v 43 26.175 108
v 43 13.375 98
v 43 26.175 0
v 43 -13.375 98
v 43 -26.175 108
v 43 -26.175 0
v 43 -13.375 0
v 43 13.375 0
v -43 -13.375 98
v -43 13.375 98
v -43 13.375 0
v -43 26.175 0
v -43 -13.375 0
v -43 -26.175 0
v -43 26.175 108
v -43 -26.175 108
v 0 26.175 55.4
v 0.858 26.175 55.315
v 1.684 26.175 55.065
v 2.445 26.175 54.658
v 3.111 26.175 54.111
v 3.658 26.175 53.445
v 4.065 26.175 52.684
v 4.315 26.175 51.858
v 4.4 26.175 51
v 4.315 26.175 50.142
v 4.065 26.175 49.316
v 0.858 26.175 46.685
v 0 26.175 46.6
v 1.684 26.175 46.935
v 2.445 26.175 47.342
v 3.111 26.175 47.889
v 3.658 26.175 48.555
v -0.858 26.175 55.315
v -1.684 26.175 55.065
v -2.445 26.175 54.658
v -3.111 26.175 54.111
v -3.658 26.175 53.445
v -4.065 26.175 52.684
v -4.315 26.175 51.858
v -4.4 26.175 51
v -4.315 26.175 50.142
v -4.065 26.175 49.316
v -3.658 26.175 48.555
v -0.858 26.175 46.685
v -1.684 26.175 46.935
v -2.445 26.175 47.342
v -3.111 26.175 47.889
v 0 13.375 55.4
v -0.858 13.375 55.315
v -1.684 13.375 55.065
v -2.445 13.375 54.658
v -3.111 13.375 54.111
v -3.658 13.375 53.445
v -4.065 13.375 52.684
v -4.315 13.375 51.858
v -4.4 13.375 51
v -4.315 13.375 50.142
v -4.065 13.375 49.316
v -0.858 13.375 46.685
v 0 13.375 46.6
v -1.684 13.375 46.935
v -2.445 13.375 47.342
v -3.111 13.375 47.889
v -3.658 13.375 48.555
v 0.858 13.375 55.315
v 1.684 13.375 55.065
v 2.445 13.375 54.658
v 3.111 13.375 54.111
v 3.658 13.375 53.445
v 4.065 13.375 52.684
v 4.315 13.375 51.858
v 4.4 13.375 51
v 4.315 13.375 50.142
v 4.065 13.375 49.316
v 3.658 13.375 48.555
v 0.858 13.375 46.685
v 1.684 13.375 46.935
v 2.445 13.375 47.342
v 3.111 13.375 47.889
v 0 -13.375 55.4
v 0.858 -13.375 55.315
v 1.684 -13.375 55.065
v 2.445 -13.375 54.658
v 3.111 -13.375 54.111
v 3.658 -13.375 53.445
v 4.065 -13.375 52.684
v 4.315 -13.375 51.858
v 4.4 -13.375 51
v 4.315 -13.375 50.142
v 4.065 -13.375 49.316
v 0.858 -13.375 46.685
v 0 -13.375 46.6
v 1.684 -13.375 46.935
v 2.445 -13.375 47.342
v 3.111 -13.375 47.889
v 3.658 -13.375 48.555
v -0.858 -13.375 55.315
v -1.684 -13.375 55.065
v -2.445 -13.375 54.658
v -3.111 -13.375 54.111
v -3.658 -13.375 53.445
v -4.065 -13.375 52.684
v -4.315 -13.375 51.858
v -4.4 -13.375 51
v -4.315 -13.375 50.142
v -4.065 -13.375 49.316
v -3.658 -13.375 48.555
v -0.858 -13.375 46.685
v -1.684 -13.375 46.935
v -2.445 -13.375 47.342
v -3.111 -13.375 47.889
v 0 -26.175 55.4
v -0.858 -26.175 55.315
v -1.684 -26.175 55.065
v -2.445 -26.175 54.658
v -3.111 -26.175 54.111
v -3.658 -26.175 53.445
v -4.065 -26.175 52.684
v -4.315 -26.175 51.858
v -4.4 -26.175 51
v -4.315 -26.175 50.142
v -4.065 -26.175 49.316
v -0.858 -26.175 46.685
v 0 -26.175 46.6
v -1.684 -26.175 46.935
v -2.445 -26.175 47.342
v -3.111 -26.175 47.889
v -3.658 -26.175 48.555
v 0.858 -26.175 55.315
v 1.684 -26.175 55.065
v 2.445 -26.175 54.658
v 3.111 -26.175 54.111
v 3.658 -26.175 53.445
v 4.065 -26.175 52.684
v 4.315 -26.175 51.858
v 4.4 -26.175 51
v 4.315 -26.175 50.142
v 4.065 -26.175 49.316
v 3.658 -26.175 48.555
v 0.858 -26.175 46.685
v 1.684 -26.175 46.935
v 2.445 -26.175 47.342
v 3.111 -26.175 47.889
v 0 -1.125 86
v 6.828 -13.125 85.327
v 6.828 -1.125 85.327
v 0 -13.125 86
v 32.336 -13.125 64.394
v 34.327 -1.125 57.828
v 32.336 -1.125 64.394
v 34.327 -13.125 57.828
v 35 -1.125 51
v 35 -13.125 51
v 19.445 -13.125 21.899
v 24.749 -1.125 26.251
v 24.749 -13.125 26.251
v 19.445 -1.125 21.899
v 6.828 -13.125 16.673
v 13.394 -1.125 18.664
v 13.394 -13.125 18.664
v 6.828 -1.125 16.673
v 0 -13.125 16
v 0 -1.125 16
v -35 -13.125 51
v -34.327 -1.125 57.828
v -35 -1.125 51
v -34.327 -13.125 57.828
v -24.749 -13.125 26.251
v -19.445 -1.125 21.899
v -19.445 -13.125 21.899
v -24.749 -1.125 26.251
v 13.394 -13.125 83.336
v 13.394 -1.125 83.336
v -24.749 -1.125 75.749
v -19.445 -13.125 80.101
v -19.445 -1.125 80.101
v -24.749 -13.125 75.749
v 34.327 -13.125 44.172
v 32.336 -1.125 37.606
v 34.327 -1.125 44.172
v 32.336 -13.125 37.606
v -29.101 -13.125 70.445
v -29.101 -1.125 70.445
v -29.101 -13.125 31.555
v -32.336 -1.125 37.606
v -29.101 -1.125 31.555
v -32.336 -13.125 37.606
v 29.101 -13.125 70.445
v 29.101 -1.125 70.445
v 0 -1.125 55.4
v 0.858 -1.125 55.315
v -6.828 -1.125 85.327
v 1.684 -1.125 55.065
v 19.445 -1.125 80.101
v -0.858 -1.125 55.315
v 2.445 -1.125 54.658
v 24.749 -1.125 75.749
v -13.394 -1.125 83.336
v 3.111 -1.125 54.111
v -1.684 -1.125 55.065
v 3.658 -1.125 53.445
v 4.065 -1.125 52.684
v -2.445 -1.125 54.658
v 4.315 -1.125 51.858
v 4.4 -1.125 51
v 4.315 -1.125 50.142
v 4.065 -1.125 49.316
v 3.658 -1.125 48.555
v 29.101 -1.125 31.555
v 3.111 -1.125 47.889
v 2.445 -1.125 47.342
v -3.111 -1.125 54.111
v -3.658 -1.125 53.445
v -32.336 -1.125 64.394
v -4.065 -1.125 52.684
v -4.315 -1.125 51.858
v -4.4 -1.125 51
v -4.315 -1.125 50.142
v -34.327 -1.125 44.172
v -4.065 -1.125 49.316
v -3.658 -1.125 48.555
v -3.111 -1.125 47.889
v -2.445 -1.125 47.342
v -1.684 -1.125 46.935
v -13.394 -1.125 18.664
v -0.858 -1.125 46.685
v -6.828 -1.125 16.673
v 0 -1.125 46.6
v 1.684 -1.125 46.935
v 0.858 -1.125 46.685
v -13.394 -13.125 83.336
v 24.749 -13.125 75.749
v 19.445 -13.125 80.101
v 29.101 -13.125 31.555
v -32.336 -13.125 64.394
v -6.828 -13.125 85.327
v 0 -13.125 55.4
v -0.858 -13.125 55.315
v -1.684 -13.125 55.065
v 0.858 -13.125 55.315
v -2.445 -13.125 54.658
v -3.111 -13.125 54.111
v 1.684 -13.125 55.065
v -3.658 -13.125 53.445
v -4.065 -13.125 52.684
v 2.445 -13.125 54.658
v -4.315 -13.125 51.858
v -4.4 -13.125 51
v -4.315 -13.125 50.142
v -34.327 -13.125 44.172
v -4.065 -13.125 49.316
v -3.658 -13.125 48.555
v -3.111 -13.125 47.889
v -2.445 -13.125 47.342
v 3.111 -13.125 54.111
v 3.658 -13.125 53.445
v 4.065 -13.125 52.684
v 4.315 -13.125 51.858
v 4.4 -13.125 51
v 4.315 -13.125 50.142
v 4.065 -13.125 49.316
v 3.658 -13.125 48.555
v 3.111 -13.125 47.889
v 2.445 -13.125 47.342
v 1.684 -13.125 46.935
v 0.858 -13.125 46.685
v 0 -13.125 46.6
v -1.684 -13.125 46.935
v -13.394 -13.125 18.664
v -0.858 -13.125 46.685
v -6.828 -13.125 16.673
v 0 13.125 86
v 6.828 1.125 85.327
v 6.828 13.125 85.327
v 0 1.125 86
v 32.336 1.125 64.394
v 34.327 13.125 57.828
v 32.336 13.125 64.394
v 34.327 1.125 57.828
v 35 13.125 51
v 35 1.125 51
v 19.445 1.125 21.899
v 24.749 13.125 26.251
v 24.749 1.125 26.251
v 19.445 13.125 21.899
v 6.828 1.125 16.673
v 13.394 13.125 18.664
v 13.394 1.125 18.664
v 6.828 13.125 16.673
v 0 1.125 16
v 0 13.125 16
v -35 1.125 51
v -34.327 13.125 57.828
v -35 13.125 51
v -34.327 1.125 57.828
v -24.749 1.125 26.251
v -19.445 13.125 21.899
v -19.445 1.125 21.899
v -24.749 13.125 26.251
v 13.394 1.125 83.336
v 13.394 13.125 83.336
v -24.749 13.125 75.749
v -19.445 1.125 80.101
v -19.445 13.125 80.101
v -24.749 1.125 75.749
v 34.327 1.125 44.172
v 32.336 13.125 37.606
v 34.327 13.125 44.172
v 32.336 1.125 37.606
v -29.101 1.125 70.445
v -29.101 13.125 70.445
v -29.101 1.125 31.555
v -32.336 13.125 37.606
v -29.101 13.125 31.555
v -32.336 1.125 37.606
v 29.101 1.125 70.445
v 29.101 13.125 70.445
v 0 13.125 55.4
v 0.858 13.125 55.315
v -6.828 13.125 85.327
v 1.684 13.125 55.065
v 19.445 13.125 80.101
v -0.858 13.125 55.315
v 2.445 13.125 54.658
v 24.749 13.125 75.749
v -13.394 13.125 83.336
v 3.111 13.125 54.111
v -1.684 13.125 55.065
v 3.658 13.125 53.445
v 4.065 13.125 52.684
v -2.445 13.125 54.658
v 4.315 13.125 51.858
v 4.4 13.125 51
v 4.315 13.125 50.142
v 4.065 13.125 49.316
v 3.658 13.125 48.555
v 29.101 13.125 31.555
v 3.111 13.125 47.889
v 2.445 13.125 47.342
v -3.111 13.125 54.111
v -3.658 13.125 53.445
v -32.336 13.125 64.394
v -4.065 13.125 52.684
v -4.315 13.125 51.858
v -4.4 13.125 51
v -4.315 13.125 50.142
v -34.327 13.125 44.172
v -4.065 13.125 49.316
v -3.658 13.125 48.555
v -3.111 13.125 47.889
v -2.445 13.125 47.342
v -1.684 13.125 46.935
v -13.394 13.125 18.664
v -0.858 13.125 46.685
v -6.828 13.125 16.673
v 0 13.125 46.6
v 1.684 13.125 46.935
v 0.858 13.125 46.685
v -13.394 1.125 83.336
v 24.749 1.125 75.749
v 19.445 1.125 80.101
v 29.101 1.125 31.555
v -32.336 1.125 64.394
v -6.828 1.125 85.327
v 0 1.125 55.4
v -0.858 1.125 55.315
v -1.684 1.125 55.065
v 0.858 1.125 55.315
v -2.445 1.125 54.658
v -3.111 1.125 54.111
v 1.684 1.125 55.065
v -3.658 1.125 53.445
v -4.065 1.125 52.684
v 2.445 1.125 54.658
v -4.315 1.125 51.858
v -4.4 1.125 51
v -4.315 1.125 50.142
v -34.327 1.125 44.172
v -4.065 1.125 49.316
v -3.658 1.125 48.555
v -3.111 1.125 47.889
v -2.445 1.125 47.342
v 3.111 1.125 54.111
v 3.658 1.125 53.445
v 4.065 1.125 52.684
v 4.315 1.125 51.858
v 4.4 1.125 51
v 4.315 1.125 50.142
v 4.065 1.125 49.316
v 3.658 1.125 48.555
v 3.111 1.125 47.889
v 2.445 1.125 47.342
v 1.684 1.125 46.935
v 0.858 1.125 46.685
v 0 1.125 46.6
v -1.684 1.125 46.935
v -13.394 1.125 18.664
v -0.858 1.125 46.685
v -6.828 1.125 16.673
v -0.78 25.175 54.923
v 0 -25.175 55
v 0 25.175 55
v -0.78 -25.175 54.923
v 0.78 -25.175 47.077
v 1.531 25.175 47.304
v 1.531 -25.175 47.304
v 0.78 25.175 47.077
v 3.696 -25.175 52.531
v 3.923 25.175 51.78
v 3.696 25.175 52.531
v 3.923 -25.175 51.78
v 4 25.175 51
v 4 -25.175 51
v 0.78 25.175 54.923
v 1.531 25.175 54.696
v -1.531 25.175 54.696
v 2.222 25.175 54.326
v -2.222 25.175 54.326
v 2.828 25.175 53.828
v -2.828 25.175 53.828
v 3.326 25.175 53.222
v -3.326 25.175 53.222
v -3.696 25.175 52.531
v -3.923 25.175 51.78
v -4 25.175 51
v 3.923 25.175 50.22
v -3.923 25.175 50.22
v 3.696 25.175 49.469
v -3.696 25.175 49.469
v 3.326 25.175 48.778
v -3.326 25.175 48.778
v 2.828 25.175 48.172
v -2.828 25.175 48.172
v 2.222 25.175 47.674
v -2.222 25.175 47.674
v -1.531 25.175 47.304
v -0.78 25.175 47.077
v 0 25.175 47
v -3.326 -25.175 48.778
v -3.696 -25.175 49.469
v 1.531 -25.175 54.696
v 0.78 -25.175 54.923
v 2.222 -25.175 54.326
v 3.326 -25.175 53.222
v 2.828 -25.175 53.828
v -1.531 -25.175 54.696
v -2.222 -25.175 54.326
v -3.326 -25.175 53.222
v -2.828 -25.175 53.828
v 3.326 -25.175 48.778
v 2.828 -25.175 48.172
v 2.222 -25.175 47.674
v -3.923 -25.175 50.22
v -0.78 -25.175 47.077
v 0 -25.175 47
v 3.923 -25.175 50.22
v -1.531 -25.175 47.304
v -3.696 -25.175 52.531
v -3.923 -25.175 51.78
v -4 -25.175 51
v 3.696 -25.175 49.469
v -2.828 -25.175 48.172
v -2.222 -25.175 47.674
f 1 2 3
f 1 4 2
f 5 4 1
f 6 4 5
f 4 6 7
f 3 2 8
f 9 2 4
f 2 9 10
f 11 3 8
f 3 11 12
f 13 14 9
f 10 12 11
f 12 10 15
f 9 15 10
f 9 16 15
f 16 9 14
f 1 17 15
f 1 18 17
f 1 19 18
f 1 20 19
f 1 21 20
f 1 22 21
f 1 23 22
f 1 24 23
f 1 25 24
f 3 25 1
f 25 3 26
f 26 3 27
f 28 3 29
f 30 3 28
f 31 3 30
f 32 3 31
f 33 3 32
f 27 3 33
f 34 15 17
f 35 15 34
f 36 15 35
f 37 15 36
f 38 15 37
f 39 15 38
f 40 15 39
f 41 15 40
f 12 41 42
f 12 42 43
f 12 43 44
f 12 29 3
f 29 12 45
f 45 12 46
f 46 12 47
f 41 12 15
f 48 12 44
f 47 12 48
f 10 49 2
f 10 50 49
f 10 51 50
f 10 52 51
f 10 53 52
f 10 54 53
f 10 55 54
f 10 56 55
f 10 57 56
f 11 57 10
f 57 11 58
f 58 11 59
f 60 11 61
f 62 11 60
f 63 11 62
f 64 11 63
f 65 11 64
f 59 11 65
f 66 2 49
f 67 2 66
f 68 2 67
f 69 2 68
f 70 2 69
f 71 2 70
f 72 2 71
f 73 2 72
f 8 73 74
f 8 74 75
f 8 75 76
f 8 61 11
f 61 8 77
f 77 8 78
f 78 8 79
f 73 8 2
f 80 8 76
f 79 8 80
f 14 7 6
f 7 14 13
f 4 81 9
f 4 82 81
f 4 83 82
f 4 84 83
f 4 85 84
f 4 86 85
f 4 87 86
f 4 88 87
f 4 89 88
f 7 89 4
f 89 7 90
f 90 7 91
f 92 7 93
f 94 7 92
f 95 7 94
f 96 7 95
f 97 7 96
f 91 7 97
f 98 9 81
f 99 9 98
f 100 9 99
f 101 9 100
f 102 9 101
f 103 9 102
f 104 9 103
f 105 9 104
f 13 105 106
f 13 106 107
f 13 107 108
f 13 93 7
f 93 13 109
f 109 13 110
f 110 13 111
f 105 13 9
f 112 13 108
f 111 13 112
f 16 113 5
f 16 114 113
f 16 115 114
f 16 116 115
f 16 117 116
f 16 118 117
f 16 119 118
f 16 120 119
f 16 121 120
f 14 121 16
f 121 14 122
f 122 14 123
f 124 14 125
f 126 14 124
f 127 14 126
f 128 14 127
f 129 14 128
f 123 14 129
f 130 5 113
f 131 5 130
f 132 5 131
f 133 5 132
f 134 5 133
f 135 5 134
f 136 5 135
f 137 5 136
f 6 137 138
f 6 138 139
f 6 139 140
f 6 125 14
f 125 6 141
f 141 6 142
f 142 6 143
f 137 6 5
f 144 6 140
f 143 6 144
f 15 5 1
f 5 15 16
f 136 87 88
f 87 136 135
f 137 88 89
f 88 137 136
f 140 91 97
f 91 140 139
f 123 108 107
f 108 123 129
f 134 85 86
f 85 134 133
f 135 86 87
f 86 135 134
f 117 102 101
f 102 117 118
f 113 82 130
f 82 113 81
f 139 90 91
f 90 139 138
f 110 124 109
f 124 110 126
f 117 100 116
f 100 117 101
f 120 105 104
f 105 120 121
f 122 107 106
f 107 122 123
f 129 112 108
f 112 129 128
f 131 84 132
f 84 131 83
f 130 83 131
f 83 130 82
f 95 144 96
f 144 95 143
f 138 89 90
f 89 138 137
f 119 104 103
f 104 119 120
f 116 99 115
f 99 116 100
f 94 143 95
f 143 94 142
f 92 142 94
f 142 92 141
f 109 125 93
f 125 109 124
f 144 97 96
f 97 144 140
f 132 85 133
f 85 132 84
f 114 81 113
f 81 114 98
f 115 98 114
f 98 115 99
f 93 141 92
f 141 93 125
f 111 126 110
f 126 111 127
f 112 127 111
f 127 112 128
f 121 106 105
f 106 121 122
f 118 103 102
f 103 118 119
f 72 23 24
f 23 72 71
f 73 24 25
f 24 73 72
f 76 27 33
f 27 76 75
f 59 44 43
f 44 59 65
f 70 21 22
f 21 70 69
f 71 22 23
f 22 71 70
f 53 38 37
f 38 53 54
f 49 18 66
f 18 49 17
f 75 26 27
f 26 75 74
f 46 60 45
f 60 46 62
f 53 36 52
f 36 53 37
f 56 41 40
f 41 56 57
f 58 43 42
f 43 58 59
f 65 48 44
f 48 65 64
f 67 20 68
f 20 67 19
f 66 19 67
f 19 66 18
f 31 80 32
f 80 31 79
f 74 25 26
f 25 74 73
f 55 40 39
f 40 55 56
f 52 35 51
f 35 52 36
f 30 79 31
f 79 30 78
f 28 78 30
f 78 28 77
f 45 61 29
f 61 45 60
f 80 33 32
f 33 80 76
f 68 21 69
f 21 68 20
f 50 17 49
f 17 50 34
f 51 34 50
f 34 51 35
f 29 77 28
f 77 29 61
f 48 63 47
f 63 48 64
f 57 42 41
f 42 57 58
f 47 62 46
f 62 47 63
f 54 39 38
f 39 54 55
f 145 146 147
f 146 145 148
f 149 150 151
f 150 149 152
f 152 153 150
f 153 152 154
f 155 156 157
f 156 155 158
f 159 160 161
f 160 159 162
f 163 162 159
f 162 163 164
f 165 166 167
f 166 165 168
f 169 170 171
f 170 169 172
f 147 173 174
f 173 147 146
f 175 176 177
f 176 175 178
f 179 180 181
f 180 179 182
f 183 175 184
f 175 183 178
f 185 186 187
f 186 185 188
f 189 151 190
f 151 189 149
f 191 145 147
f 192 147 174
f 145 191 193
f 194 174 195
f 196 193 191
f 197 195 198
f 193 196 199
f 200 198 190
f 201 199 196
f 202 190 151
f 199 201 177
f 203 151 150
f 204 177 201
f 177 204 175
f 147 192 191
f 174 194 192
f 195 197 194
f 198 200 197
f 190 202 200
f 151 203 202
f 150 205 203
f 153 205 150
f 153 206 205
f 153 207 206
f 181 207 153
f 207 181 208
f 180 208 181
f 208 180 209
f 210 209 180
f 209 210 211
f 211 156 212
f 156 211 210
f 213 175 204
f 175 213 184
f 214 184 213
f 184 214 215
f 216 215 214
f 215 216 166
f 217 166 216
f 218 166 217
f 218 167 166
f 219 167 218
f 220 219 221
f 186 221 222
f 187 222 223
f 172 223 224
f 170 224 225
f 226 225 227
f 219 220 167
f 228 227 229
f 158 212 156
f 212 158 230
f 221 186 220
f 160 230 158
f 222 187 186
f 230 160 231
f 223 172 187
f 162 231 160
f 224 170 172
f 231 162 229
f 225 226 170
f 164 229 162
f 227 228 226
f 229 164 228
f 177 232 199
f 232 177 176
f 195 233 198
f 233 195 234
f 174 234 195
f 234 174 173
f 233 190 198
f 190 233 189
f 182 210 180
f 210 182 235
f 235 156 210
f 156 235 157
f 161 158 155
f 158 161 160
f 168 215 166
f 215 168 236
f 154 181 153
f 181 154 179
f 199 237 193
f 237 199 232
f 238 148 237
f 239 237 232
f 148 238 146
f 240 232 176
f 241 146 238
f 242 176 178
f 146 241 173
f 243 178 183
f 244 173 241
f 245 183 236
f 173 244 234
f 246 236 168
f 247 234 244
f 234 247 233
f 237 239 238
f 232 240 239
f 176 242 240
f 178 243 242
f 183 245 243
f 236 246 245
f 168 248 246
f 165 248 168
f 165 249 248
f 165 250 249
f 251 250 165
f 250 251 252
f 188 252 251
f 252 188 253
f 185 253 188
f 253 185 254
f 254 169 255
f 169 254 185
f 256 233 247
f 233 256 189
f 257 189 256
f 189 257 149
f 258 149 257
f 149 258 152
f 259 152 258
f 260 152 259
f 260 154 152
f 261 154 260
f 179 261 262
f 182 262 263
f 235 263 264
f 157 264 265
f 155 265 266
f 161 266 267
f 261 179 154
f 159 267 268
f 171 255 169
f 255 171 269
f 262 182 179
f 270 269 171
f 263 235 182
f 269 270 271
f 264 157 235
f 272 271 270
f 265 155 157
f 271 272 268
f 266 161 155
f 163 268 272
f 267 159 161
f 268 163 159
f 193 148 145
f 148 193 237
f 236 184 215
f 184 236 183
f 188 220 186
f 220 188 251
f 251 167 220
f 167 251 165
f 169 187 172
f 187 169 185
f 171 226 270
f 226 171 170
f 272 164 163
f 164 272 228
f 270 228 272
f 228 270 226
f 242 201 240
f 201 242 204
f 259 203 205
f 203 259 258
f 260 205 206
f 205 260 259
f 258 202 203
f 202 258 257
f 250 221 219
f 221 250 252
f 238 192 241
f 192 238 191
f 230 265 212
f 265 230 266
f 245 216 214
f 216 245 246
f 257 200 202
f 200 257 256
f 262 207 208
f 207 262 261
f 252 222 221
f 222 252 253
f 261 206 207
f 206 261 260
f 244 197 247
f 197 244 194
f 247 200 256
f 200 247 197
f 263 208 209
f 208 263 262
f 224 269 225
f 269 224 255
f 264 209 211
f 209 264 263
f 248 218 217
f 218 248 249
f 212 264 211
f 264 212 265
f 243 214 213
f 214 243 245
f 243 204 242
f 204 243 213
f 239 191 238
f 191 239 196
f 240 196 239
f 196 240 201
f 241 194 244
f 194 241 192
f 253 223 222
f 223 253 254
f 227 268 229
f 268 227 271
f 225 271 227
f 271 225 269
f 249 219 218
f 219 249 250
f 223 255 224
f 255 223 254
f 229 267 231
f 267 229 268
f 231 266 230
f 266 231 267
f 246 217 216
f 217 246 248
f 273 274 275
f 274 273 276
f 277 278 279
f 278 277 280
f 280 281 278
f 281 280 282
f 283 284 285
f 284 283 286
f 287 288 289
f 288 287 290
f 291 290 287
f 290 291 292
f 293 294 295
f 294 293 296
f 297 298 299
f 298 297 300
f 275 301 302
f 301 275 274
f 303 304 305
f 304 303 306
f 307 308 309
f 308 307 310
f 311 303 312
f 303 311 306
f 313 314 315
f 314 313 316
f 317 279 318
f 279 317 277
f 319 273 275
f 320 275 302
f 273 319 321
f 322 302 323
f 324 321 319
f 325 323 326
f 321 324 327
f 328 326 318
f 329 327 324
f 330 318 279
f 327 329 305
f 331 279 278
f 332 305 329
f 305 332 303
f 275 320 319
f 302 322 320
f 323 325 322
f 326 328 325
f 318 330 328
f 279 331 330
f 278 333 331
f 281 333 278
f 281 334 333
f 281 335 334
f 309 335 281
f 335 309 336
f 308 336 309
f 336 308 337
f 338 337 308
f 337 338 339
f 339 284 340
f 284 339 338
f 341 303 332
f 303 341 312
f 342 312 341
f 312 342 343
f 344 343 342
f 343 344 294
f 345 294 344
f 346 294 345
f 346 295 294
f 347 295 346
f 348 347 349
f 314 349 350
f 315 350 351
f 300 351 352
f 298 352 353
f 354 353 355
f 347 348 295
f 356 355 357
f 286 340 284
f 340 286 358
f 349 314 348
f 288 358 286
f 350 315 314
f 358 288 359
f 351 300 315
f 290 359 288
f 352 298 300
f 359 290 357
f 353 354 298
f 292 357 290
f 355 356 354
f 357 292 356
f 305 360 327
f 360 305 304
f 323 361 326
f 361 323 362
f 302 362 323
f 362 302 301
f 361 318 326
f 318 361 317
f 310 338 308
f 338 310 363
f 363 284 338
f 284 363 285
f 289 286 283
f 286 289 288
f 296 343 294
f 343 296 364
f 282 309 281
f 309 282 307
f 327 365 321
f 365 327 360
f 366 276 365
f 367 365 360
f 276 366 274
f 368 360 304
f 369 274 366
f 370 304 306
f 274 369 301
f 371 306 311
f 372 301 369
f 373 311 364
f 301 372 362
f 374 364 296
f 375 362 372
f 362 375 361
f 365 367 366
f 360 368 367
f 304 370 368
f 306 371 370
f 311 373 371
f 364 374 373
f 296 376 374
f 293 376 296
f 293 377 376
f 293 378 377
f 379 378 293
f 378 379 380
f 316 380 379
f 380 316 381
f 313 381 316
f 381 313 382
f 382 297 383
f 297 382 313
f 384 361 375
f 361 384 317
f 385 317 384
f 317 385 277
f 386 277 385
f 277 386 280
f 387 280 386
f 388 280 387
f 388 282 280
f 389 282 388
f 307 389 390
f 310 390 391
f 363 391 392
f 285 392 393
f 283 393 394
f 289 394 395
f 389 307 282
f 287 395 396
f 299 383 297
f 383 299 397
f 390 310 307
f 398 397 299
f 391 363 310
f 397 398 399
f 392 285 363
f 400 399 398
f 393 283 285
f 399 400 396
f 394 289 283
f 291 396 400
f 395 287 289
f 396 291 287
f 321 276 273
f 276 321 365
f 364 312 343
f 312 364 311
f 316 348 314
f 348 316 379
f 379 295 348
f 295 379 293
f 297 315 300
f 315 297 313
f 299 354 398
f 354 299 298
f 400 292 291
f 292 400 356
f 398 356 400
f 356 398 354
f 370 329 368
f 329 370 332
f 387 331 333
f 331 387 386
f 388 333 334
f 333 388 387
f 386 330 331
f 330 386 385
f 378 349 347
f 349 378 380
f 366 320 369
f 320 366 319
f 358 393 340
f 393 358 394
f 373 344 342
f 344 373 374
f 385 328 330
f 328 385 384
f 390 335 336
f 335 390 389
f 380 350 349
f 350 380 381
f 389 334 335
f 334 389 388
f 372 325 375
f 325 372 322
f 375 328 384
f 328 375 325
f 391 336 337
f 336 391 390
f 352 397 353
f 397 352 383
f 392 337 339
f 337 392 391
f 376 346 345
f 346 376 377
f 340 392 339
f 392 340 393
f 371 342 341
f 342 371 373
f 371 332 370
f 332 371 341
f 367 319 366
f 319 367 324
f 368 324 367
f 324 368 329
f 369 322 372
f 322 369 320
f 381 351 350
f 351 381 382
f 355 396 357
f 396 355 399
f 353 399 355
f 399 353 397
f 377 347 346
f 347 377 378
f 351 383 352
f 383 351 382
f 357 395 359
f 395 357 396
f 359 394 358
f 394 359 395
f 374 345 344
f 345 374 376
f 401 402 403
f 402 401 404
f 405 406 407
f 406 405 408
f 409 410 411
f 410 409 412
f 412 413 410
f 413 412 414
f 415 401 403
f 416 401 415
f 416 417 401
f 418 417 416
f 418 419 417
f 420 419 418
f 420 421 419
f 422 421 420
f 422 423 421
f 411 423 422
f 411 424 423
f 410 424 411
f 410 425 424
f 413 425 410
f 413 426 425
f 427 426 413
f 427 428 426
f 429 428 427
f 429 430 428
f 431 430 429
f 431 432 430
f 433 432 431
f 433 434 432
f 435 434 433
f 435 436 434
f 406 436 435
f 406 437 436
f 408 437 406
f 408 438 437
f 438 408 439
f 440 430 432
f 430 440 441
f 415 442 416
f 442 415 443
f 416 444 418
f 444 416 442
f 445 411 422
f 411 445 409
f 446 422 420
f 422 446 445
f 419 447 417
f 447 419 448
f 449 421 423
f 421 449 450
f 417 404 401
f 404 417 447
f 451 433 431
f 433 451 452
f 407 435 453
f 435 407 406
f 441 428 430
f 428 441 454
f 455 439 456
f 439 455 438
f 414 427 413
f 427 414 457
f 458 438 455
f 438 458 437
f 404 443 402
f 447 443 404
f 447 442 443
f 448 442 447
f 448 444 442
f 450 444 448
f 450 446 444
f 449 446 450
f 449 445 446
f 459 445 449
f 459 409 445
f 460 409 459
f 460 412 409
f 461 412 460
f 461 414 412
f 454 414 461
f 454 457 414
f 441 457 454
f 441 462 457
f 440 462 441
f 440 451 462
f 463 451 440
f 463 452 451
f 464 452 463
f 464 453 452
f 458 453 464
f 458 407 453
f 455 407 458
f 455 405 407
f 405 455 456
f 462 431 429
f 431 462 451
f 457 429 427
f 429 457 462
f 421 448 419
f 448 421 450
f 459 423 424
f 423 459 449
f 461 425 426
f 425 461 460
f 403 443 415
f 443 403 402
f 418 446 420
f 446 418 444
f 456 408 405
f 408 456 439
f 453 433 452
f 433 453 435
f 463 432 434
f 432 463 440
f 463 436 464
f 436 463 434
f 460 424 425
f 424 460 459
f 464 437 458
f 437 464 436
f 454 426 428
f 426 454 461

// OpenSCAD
$fn = 32;

// ------------------------------------------------------------------------
// Trolley wheel set: wheels d70, fork 98 mm tall
// Every part is its own module, assembly() places every instance.
// ------------------------------------------------------------------------

// --- part 1 ---
module trolley_fork() {
  difference() {
    union() {
      translate([-43, 13.375, 0]) cube([86, 12.8, 98]);
      translate([-43, -26.175, 0]) cube([86, 12.8, 98]);
      translate([-43, -26.175, 98]) cube([86, 52.35, 10]);
    }
    translate([0, -19.775, 51]) rotate([90, 0, 0]) cylinder(h = 14.8, d = 8.8, center = true);
    translate([0, 19.775, 51]) rotate([90, 0, 0]) cylinder(h = 14.8, d = 8.8, center = true);
  }
}

// --- part 2 ---
module trolley_wheel() {
  difference() {
      translate([0, 0, 0]) cylinder(h = 12, d = 70);
      translate([0, 0, -1]) cylinder(h = 14, d = 8.8);
    }
}

// --- part 3 ---
module trolley_axle() {
  translate([0, 0, -25.175]) cylinder(h = 50.35, d = 8);
}

// --- assembly ---
module assembly() {
  color([0.80, 0.24, 0.20]) translate([0, 0, 0]) rotate([0, 0, 0]) trolley_fork();
  color([0.20, 0.45, 0.75]) translate([0, -1.125, 51]) rotate([90, 0, 0]) trolley_wheel();
  color([0.25, 0.62, 0.32]) translate([0, 13.125, 51]) rotate([90, 0, 0]) trolley_wheel();
  color([0.92, 0.70, 0.18]) translate([0, 0, 51]) rotate([90, 0, 0]) trolley_axle();
}

assembly();
